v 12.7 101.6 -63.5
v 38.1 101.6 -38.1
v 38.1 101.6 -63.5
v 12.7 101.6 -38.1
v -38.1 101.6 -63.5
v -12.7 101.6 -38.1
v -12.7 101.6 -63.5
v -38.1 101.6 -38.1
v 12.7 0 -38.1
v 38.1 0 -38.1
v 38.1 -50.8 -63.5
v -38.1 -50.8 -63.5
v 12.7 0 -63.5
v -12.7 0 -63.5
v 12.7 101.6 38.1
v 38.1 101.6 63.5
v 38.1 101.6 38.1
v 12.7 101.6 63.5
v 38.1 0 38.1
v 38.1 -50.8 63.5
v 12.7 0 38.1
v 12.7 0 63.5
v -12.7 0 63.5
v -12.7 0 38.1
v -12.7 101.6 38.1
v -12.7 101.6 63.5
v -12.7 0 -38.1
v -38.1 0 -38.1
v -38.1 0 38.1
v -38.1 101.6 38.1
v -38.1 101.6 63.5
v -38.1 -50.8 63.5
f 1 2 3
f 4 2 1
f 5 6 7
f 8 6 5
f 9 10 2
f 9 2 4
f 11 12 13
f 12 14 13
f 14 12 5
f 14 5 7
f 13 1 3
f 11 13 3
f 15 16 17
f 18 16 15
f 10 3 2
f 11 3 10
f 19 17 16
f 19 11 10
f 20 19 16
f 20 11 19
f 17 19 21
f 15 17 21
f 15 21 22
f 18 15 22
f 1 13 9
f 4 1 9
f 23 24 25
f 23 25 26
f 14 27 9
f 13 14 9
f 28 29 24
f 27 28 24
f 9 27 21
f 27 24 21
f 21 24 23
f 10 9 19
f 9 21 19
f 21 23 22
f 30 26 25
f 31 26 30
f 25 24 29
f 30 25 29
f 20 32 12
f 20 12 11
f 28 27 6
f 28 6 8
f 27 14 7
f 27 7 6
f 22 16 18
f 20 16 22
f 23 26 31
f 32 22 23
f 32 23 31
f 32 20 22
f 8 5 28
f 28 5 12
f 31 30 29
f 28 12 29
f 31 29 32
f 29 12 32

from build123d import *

# Parameters (mm, degrees)
F0_W     = 76.2
F0_H     = 127
F1_DEPTH = 50.8
F2_W     = 25.4
F2_H     = 25.4
F3_DEPTH = 101.6
F4_DEPTH = 101.6


with BuildPart() as f1:
    # F0 (on Front) → F1 (new body)
    with BuildSketch(Plane.XZ):
        Rectangle(F0_W, F0_H)
    extrude(amount=F1_DEPTH)

    # F2 (on face) → F3 (join)
    with BuildSketch(Plane(origin=(0, 0, 0), x_dir=(-1, 0, 0), z_dir=(0, 1, 0))):
        with Locations((-25.4, 50.8)):
            Rectangle(F2_W, F2_H)
    extrude(amount=F3_DEPTH)

    # F2 (on face) → F4 (join)
    with BuildSketch(Plane(origin=(0, 0, 0), x_dir=(-1, 0, 0), z_dir=(0, 1, 0))):
        with Locations((25.4, 50.8)):
            Rectangle(F2_W, F2_H)
        with Locations((-25.4, 50.8)):
            Rectangle(F2_W, F2_H)
        with Locations((25.4, -50.8)):
            Rectangle(F2_W, F2_H)
        with Locations((-25.4, -50.8)):
            Rectangle(F2_W, F2_H)
    extrude(amount=F4_DEPTH)


solid = f1.part
